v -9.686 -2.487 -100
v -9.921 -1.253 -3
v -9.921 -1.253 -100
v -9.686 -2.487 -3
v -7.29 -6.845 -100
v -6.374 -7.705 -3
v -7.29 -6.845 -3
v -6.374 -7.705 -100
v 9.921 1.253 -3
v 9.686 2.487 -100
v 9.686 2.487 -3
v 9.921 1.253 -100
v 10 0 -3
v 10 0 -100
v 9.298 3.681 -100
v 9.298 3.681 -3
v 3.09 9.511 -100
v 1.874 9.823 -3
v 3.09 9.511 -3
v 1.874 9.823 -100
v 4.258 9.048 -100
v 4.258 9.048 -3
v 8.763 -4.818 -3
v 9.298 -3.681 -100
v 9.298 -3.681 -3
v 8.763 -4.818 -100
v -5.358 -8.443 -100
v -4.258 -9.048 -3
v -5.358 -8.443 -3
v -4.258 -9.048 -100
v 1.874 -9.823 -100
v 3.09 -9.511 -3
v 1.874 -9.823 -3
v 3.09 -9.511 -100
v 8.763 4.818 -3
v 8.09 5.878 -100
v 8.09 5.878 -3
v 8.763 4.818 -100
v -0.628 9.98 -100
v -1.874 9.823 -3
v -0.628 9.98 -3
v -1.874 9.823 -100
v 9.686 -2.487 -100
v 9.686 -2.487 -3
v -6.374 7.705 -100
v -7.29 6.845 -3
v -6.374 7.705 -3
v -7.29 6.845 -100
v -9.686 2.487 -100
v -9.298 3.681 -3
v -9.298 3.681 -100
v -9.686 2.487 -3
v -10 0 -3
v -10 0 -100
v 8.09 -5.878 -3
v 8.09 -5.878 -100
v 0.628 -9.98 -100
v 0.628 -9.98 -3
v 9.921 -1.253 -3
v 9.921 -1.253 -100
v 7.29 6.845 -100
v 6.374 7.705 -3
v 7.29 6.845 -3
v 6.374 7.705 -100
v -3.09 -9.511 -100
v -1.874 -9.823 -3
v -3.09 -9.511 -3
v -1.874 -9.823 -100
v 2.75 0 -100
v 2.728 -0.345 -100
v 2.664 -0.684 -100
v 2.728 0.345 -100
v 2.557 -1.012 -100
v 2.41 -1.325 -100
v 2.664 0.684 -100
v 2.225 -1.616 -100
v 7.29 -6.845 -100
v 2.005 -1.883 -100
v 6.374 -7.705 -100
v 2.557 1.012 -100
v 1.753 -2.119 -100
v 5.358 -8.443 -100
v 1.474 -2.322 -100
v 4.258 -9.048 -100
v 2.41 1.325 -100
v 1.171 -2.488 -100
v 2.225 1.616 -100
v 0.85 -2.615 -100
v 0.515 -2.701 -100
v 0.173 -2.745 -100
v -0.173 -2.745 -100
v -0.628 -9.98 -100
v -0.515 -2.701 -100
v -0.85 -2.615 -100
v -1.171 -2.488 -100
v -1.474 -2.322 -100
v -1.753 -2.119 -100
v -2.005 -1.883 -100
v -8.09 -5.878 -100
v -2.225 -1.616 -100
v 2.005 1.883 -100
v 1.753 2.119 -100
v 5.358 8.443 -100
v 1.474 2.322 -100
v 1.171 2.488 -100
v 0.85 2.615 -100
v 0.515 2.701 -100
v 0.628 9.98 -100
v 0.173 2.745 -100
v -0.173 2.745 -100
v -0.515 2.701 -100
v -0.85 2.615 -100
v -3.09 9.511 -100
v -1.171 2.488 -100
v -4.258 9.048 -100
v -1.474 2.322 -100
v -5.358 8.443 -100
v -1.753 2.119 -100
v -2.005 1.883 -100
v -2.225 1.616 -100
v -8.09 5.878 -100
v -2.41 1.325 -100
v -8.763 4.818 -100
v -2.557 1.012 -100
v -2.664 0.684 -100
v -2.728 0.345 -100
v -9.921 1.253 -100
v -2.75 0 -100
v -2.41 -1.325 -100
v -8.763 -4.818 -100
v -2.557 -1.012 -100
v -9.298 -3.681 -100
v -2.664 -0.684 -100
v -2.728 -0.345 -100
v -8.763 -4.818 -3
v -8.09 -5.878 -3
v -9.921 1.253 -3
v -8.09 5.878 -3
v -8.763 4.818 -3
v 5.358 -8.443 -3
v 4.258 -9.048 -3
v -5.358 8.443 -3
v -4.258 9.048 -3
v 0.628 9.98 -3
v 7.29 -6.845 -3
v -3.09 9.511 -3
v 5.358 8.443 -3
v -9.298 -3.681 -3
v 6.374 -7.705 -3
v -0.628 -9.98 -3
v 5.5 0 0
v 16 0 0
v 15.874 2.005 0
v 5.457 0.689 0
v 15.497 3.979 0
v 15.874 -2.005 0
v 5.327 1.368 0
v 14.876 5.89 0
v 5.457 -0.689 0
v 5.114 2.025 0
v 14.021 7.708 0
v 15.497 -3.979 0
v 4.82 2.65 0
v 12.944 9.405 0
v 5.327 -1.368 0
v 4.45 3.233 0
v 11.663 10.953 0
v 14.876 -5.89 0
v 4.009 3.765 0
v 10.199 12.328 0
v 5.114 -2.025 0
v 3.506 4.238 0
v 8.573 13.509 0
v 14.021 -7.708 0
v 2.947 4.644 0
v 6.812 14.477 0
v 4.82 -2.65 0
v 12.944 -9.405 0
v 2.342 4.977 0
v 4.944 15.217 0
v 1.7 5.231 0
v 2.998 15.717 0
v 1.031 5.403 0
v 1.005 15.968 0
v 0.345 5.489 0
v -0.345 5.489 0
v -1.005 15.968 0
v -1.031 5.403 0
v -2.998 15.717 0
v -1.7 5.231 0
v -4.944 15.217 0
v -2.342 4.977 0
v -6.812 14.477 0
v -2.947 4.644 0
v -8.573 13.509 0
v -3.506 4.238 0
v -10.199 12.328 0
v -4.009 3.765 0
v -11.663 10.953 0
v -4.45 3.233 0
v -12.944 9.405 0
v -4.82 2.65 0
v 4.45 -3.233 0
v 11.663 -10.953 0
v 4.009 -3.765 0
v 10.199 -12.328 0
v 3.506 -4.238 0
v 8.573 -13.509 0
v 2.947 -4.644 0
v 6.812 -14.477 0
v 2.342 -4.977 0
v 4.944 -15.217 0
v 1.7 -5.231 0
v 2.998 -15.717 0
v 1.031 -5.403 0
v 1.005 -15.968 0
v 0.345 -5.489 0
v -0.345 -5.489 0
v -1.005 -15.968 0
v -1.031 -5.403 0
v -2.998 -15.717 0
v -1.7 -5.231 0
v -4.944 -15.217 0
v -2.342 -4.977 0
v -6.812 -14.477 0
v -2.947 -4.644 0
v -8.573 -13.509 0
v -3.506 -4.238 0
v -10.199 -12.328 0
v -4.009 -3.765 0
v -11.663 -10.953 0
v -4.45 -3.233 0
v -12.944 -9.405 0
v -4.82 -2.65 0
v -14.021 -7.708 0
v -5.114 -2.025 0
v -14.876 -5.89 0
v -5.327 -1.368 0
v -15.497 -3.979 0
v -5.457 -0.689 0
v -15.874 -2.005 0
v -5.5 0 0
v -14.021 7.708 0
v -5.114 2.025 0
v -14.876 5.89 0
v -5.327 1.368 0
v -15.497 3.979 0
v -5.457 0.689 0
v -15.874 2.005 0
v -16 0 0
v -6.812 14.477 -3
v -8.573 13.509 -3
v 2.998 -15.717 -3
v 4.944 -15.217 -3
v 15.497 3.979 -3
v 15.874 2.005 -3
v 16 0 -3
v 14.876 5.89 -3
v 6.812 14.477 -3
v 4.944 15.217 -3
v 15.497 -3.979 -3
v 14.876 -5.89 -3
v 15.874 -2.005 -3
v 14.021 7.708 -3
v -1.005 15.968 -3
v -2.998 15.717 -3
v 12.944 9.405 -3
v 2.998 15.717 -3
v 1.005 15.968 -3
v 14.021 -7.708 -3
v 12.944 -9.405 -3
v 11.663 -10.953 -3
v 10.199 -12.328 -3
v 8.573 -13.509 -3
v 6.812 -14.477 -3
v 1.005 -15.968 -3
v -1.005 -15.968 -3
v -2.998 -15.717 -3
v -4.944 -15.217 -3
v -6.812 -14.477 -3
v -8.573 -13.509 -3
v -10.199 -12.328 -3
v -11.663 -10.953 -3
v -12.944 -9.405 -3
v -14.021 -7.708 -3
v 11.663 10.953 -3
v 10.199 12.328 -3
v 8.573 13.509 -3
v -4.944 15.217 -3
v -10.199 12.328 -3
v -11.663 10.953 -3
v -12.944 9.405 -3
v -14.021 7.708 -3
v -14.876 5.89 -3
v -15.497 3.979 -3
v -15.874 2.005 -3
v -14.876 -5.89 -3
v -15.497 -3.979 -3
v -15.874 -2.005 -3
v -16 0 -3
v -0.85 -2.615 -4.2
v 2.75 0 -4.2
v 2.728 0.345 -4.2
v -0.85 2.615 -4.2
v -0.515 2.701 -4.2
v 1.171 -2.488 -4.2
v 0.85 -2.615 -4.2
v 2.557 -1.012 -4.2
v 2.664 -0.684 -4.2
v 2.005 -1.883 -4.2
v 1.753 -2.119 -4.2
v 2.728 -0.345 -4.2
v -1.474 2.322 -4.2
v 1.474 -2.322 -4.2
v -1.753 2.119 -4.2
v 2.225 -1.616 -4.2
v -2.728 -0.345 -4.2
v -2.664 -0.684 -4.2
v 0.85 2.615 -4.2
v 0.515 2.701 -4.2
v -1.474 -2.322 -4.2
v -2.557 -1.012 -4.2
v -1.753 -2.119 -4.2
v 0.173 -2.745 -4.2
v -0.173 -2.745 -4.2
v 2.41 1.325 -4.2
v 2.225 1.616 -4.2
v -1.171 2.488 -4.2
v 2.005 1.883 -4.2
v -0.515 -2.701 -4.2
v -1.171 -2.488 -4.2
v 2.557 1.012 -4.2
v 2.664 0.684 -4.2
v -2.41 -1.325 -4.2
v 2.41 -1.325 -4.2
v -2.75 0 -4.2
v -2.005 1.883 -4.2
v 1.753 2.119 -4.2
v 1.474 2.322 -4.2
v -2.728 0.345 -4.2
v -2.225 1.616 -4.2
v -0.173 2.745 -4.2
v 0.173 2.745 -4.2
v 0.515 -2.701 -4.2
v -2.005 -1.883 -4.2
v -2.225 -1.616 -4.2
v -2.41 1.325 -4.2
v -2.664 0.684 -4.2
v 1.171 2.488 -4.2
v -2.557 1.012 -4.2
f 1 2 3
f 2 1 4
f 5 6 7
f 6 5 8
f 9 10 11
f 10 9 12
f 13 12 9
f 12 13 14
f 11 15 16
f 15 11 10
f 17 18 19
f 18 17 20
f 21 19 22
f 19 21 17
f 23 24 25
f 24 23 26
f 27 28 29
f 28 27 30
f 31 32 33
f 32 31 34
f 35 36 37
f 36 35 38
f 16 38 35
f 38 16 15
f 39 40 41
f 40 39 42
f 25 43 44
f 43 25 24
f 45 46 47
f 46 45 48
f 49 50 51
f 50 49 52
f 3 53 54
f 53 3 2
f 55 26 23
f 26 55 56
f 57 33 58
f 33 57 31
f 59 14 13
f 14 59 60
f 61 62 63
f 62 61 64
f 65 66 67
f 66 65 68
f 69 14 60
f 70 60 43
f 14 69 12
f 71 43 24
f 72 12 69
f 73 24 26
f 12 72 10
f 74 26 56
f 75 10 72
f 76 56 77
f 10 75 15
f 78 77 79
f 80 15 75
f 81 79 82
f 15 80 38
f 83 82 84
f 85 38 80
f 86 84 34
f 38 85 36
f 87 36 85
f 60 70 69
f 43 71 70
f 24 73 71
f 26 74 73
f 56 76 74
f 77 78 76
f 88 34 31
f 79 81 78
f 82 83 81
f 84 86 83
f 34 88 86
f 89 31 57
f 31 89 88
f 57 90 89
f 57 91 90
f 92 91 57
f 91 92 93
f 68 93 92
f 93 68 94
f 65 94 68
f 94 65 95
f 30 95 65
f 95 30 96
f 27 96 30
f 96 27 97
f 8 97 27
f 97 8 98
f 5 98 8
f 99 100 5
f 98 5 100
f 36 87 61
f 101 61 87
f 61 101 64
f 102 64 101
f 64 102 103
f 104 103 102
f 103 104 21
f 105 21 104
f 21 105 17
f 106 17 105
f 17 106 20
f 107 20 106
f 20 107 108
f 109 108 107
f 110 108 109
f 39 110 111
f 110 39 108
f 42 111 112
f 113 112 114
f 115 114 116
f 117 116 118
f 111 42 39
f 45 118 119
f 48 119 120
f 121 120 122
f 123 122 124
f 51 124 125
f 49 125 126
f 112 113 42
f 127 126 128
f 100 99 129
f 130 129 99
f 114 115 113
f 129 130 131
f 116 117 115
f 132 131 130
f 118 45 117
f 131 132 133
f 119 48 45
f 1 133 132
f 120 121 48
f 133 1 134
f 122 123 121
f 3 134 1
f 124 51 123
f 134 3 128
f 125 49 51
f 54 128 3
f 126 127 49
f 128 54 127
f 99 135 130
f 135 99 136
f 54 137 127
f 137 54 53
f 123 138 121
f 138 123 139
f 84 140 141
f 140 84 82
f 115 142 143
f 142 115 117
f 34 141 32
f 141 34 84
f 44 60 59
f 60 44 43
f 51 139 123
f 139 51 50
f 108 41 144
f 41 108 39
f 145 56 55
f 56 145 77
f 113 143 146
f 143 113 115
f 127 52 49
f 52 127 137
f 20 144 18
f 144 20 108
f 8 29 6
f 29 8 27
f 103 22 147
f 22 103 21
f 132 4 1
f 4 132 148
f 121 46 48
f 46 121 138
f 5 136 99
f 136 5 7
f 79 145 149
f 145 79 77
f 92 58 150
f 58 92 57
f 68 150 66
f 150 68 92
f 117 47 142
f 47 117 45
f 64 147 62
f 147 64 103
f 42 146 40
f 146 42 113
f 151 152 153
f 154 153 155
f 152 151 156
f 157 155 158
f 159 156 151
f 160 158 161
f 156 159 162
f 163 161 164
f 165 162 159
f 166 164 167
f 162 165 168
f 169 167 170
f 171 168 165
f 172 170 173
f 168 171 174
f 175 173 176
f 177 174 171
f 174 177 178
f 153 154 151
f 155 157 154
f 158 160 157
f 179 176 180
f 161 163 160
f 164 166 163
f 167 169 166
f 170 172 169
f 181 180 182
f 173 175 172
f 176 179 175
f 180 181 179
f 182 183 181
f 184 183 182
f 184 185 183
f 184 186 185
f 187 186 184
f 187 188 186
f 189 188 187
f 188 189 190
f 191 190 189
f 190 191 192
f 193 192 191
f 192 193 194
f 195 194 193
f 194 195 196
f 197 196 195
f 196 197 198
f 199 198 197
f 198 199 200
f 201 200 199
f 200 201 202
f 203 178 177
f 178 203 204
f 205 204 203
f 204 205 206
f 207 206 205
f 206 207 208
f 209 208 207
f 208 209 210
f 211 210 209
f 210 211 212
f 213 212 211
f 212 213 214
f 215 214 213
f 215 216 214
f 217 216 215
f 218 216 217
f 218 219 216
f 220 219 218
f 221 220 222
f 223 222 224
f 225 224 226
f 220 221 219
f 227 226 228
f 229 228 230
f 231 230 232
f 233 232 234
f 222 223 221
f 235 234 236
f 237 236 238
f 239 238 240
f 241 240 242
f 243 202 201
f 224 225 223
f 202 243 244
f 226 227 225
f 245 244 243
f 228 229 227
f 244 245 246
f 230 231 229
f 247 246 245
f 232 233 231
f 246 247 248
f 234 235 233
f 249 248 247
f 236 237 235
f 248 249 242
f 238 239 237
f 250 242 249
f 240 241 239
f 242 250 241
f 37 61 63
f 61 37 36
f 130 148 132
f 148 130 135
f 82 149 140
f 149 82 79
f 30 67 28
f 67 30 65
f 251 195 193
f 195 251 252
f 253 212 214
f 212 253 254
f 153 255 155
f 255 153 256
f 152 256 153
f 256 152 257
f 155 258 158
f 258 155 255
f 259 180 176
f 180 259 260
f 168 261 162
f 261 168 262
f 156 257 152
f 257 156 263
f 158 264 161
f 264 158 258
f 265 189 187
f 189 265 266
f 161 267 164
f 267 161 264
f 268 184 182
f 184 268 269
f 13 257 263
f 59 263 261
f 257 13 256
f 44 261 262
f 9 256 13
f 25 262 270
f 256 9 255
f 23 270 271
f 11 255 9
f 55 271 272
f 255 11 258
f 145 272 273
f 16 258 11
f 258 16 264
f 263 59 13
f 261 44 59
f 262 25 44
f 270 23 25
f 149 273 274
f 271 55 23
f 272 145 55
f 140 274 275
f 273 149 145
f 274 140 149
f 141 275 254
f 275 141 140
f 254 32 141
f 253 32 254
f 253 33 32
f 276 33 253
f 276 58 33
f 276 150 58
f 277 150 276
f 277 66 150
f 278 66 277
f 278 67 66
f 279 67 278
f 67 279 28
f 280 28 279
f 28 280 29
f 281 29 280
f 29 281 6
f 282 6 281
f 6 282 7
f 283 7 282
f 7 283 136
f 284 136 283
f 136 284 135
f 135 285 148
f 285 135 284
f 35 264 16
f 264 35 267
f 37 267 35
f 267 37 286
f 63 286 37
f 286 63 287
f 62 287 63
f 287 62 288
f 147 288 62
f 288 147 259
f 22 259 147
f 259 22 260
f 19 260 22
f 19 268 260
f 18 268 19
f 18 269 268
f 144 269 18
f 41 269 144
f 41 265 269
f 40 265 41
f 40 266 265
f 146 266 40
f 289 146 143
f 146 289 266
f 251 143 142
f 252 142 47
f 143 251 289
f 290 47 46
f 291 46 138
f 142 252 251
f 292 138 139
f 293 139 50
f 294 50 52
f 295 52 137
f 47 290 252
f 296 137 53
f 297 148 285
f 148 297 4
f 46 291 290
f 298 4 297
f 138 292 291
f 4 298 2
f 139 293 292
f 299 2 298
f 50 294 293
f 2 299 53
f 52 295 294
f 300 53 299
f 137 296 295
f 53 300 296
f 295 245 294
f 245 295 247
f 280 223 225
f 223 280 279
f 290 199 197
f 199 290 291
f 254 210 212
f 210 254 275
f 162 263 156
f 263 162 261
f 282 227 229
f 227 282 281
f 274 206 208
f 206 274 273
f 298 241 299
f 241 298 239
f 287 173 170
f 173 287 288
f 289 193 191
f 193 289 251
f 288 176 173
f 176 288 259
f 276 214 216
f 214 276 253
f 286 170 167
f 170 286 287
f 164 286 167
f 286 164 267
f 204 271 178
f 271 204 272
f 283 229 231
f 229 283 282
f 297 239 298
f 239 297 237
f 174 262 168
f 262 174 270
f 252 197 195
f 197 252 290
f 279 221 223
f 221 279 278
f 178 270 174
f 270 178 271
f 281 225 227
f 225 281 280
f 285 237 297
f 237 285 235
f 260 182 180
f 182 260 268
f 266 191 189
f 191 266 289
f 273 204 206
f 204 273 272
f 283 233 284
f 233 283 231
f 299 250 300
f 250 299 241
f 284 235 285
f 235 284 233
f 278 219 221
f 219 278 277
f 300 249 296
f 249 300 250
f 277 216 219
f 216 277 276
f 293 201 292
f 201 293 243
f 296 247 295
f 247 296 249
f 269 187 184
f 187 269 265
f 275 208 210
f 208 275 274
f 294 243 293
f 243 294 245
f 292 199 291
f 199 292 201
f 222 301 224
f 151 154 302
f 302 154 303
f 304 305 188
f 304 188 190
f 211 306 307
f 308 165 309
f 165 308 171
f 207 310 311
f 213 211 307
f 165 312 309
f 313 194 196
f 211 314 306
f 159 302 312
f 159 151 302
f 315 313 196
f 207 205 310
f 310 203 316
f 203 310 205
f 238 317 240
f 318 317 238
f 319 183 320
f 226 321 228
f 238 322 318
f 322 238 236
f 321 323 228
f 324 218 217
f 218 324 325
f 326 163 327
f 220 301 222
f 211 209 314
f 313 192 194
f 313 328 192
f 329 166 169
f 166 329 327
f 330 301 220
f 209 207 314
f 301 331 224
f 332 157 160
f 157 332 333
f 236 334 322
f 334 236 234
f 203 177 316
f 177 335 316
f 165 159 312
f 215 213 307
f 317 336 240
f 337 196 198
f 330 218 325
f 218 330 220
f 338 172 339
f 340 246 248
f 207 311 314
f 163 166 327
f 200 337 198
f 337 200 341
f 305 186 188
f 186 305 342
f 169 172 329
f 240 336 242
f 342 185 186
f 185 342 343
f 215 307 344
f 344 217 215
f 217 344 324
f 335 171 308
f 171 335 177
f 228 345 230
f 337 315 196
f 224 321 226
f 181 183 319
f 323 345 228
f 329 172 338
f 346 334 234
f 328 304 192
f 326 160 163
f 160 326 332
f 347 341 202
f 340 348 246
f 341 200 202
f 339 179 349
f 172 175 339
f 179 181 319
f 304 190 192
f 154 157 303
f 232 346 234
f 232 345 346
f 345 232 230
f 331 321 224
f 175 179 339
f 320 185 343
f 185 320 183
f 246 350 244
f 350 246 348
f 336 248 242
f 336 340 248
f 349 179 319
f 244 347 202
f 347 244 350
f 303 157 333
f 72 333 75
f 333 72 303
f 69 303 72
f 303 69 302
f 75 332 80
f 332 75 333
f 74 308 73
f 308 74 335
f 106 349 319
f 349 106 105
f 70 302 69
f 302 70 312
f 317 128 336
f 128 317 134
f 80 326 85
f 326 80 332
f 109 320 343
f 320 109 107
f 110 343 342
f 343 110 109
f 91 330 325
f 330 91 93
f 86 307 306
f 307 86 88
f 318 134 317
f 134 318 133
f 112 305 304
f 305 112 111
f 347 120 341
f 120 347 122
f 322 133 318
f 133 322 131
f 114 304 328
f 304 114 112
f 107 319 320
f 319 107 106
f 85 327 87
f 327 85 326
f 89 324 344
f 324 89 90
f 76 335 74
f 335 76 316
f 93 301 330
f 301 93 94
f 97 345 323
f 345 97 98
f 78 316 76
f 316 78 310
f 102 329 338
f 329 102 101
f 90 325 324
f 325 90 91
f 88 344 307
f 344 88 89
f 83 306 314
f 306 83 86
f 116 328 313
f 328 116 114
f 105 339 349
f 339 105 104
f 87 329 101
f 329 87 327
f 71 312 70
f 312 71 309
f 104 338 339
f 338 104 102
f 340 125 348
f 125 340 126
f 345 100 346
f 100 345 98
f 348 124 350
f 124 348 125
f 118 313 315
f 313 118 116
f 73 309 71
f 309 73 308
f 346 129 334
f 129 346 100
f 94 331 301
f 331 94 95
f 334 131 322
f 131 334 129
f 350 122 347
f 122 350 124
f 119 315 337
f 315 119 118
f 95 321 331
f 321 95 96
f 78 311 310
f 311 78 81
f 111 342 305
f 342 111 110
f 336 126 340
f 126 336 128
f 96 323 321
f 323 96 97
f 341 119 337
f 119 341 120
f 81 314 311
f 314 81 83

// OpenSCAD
$fn = 50;


difference() {
	union() {
		translate(v = [0, 0, -100.0000000000]) {
			cylinder(h = 100, r = 10.0000000000);
		}
		translate(v = [0, 0, -3.0000000000]) {
			cylinder(h = 3, r = 16.0000000000);
		}
	}
	union() {
		translate(v = [0, 0, 0]) {
			rotate(a = [0, 0, 0]) {
				difference() {
					union() {
						#translate(v = [0, 0, -100.0000000000]) {
							cylinder(h = 100, r = 2.2500000000);
						}
						#translate(v = [0, 0, -4.2000000000]) {
							cylinder(h = 4.2000000000, r = 10.0000000000, r1 = 2.7500000000, r2 = 5.5000000000);
						}
						#translate(v = [0, 0, -100.0000000000]) {
							cylinder(h = 100, r = 2.7500000000);
						}
						#translate(v = [0, 0, -100.0000000000]) {
							cylinder(h = 100, r = 2.2500000000);
						}
					}
					union();
				}
			}
		}
	}
}
